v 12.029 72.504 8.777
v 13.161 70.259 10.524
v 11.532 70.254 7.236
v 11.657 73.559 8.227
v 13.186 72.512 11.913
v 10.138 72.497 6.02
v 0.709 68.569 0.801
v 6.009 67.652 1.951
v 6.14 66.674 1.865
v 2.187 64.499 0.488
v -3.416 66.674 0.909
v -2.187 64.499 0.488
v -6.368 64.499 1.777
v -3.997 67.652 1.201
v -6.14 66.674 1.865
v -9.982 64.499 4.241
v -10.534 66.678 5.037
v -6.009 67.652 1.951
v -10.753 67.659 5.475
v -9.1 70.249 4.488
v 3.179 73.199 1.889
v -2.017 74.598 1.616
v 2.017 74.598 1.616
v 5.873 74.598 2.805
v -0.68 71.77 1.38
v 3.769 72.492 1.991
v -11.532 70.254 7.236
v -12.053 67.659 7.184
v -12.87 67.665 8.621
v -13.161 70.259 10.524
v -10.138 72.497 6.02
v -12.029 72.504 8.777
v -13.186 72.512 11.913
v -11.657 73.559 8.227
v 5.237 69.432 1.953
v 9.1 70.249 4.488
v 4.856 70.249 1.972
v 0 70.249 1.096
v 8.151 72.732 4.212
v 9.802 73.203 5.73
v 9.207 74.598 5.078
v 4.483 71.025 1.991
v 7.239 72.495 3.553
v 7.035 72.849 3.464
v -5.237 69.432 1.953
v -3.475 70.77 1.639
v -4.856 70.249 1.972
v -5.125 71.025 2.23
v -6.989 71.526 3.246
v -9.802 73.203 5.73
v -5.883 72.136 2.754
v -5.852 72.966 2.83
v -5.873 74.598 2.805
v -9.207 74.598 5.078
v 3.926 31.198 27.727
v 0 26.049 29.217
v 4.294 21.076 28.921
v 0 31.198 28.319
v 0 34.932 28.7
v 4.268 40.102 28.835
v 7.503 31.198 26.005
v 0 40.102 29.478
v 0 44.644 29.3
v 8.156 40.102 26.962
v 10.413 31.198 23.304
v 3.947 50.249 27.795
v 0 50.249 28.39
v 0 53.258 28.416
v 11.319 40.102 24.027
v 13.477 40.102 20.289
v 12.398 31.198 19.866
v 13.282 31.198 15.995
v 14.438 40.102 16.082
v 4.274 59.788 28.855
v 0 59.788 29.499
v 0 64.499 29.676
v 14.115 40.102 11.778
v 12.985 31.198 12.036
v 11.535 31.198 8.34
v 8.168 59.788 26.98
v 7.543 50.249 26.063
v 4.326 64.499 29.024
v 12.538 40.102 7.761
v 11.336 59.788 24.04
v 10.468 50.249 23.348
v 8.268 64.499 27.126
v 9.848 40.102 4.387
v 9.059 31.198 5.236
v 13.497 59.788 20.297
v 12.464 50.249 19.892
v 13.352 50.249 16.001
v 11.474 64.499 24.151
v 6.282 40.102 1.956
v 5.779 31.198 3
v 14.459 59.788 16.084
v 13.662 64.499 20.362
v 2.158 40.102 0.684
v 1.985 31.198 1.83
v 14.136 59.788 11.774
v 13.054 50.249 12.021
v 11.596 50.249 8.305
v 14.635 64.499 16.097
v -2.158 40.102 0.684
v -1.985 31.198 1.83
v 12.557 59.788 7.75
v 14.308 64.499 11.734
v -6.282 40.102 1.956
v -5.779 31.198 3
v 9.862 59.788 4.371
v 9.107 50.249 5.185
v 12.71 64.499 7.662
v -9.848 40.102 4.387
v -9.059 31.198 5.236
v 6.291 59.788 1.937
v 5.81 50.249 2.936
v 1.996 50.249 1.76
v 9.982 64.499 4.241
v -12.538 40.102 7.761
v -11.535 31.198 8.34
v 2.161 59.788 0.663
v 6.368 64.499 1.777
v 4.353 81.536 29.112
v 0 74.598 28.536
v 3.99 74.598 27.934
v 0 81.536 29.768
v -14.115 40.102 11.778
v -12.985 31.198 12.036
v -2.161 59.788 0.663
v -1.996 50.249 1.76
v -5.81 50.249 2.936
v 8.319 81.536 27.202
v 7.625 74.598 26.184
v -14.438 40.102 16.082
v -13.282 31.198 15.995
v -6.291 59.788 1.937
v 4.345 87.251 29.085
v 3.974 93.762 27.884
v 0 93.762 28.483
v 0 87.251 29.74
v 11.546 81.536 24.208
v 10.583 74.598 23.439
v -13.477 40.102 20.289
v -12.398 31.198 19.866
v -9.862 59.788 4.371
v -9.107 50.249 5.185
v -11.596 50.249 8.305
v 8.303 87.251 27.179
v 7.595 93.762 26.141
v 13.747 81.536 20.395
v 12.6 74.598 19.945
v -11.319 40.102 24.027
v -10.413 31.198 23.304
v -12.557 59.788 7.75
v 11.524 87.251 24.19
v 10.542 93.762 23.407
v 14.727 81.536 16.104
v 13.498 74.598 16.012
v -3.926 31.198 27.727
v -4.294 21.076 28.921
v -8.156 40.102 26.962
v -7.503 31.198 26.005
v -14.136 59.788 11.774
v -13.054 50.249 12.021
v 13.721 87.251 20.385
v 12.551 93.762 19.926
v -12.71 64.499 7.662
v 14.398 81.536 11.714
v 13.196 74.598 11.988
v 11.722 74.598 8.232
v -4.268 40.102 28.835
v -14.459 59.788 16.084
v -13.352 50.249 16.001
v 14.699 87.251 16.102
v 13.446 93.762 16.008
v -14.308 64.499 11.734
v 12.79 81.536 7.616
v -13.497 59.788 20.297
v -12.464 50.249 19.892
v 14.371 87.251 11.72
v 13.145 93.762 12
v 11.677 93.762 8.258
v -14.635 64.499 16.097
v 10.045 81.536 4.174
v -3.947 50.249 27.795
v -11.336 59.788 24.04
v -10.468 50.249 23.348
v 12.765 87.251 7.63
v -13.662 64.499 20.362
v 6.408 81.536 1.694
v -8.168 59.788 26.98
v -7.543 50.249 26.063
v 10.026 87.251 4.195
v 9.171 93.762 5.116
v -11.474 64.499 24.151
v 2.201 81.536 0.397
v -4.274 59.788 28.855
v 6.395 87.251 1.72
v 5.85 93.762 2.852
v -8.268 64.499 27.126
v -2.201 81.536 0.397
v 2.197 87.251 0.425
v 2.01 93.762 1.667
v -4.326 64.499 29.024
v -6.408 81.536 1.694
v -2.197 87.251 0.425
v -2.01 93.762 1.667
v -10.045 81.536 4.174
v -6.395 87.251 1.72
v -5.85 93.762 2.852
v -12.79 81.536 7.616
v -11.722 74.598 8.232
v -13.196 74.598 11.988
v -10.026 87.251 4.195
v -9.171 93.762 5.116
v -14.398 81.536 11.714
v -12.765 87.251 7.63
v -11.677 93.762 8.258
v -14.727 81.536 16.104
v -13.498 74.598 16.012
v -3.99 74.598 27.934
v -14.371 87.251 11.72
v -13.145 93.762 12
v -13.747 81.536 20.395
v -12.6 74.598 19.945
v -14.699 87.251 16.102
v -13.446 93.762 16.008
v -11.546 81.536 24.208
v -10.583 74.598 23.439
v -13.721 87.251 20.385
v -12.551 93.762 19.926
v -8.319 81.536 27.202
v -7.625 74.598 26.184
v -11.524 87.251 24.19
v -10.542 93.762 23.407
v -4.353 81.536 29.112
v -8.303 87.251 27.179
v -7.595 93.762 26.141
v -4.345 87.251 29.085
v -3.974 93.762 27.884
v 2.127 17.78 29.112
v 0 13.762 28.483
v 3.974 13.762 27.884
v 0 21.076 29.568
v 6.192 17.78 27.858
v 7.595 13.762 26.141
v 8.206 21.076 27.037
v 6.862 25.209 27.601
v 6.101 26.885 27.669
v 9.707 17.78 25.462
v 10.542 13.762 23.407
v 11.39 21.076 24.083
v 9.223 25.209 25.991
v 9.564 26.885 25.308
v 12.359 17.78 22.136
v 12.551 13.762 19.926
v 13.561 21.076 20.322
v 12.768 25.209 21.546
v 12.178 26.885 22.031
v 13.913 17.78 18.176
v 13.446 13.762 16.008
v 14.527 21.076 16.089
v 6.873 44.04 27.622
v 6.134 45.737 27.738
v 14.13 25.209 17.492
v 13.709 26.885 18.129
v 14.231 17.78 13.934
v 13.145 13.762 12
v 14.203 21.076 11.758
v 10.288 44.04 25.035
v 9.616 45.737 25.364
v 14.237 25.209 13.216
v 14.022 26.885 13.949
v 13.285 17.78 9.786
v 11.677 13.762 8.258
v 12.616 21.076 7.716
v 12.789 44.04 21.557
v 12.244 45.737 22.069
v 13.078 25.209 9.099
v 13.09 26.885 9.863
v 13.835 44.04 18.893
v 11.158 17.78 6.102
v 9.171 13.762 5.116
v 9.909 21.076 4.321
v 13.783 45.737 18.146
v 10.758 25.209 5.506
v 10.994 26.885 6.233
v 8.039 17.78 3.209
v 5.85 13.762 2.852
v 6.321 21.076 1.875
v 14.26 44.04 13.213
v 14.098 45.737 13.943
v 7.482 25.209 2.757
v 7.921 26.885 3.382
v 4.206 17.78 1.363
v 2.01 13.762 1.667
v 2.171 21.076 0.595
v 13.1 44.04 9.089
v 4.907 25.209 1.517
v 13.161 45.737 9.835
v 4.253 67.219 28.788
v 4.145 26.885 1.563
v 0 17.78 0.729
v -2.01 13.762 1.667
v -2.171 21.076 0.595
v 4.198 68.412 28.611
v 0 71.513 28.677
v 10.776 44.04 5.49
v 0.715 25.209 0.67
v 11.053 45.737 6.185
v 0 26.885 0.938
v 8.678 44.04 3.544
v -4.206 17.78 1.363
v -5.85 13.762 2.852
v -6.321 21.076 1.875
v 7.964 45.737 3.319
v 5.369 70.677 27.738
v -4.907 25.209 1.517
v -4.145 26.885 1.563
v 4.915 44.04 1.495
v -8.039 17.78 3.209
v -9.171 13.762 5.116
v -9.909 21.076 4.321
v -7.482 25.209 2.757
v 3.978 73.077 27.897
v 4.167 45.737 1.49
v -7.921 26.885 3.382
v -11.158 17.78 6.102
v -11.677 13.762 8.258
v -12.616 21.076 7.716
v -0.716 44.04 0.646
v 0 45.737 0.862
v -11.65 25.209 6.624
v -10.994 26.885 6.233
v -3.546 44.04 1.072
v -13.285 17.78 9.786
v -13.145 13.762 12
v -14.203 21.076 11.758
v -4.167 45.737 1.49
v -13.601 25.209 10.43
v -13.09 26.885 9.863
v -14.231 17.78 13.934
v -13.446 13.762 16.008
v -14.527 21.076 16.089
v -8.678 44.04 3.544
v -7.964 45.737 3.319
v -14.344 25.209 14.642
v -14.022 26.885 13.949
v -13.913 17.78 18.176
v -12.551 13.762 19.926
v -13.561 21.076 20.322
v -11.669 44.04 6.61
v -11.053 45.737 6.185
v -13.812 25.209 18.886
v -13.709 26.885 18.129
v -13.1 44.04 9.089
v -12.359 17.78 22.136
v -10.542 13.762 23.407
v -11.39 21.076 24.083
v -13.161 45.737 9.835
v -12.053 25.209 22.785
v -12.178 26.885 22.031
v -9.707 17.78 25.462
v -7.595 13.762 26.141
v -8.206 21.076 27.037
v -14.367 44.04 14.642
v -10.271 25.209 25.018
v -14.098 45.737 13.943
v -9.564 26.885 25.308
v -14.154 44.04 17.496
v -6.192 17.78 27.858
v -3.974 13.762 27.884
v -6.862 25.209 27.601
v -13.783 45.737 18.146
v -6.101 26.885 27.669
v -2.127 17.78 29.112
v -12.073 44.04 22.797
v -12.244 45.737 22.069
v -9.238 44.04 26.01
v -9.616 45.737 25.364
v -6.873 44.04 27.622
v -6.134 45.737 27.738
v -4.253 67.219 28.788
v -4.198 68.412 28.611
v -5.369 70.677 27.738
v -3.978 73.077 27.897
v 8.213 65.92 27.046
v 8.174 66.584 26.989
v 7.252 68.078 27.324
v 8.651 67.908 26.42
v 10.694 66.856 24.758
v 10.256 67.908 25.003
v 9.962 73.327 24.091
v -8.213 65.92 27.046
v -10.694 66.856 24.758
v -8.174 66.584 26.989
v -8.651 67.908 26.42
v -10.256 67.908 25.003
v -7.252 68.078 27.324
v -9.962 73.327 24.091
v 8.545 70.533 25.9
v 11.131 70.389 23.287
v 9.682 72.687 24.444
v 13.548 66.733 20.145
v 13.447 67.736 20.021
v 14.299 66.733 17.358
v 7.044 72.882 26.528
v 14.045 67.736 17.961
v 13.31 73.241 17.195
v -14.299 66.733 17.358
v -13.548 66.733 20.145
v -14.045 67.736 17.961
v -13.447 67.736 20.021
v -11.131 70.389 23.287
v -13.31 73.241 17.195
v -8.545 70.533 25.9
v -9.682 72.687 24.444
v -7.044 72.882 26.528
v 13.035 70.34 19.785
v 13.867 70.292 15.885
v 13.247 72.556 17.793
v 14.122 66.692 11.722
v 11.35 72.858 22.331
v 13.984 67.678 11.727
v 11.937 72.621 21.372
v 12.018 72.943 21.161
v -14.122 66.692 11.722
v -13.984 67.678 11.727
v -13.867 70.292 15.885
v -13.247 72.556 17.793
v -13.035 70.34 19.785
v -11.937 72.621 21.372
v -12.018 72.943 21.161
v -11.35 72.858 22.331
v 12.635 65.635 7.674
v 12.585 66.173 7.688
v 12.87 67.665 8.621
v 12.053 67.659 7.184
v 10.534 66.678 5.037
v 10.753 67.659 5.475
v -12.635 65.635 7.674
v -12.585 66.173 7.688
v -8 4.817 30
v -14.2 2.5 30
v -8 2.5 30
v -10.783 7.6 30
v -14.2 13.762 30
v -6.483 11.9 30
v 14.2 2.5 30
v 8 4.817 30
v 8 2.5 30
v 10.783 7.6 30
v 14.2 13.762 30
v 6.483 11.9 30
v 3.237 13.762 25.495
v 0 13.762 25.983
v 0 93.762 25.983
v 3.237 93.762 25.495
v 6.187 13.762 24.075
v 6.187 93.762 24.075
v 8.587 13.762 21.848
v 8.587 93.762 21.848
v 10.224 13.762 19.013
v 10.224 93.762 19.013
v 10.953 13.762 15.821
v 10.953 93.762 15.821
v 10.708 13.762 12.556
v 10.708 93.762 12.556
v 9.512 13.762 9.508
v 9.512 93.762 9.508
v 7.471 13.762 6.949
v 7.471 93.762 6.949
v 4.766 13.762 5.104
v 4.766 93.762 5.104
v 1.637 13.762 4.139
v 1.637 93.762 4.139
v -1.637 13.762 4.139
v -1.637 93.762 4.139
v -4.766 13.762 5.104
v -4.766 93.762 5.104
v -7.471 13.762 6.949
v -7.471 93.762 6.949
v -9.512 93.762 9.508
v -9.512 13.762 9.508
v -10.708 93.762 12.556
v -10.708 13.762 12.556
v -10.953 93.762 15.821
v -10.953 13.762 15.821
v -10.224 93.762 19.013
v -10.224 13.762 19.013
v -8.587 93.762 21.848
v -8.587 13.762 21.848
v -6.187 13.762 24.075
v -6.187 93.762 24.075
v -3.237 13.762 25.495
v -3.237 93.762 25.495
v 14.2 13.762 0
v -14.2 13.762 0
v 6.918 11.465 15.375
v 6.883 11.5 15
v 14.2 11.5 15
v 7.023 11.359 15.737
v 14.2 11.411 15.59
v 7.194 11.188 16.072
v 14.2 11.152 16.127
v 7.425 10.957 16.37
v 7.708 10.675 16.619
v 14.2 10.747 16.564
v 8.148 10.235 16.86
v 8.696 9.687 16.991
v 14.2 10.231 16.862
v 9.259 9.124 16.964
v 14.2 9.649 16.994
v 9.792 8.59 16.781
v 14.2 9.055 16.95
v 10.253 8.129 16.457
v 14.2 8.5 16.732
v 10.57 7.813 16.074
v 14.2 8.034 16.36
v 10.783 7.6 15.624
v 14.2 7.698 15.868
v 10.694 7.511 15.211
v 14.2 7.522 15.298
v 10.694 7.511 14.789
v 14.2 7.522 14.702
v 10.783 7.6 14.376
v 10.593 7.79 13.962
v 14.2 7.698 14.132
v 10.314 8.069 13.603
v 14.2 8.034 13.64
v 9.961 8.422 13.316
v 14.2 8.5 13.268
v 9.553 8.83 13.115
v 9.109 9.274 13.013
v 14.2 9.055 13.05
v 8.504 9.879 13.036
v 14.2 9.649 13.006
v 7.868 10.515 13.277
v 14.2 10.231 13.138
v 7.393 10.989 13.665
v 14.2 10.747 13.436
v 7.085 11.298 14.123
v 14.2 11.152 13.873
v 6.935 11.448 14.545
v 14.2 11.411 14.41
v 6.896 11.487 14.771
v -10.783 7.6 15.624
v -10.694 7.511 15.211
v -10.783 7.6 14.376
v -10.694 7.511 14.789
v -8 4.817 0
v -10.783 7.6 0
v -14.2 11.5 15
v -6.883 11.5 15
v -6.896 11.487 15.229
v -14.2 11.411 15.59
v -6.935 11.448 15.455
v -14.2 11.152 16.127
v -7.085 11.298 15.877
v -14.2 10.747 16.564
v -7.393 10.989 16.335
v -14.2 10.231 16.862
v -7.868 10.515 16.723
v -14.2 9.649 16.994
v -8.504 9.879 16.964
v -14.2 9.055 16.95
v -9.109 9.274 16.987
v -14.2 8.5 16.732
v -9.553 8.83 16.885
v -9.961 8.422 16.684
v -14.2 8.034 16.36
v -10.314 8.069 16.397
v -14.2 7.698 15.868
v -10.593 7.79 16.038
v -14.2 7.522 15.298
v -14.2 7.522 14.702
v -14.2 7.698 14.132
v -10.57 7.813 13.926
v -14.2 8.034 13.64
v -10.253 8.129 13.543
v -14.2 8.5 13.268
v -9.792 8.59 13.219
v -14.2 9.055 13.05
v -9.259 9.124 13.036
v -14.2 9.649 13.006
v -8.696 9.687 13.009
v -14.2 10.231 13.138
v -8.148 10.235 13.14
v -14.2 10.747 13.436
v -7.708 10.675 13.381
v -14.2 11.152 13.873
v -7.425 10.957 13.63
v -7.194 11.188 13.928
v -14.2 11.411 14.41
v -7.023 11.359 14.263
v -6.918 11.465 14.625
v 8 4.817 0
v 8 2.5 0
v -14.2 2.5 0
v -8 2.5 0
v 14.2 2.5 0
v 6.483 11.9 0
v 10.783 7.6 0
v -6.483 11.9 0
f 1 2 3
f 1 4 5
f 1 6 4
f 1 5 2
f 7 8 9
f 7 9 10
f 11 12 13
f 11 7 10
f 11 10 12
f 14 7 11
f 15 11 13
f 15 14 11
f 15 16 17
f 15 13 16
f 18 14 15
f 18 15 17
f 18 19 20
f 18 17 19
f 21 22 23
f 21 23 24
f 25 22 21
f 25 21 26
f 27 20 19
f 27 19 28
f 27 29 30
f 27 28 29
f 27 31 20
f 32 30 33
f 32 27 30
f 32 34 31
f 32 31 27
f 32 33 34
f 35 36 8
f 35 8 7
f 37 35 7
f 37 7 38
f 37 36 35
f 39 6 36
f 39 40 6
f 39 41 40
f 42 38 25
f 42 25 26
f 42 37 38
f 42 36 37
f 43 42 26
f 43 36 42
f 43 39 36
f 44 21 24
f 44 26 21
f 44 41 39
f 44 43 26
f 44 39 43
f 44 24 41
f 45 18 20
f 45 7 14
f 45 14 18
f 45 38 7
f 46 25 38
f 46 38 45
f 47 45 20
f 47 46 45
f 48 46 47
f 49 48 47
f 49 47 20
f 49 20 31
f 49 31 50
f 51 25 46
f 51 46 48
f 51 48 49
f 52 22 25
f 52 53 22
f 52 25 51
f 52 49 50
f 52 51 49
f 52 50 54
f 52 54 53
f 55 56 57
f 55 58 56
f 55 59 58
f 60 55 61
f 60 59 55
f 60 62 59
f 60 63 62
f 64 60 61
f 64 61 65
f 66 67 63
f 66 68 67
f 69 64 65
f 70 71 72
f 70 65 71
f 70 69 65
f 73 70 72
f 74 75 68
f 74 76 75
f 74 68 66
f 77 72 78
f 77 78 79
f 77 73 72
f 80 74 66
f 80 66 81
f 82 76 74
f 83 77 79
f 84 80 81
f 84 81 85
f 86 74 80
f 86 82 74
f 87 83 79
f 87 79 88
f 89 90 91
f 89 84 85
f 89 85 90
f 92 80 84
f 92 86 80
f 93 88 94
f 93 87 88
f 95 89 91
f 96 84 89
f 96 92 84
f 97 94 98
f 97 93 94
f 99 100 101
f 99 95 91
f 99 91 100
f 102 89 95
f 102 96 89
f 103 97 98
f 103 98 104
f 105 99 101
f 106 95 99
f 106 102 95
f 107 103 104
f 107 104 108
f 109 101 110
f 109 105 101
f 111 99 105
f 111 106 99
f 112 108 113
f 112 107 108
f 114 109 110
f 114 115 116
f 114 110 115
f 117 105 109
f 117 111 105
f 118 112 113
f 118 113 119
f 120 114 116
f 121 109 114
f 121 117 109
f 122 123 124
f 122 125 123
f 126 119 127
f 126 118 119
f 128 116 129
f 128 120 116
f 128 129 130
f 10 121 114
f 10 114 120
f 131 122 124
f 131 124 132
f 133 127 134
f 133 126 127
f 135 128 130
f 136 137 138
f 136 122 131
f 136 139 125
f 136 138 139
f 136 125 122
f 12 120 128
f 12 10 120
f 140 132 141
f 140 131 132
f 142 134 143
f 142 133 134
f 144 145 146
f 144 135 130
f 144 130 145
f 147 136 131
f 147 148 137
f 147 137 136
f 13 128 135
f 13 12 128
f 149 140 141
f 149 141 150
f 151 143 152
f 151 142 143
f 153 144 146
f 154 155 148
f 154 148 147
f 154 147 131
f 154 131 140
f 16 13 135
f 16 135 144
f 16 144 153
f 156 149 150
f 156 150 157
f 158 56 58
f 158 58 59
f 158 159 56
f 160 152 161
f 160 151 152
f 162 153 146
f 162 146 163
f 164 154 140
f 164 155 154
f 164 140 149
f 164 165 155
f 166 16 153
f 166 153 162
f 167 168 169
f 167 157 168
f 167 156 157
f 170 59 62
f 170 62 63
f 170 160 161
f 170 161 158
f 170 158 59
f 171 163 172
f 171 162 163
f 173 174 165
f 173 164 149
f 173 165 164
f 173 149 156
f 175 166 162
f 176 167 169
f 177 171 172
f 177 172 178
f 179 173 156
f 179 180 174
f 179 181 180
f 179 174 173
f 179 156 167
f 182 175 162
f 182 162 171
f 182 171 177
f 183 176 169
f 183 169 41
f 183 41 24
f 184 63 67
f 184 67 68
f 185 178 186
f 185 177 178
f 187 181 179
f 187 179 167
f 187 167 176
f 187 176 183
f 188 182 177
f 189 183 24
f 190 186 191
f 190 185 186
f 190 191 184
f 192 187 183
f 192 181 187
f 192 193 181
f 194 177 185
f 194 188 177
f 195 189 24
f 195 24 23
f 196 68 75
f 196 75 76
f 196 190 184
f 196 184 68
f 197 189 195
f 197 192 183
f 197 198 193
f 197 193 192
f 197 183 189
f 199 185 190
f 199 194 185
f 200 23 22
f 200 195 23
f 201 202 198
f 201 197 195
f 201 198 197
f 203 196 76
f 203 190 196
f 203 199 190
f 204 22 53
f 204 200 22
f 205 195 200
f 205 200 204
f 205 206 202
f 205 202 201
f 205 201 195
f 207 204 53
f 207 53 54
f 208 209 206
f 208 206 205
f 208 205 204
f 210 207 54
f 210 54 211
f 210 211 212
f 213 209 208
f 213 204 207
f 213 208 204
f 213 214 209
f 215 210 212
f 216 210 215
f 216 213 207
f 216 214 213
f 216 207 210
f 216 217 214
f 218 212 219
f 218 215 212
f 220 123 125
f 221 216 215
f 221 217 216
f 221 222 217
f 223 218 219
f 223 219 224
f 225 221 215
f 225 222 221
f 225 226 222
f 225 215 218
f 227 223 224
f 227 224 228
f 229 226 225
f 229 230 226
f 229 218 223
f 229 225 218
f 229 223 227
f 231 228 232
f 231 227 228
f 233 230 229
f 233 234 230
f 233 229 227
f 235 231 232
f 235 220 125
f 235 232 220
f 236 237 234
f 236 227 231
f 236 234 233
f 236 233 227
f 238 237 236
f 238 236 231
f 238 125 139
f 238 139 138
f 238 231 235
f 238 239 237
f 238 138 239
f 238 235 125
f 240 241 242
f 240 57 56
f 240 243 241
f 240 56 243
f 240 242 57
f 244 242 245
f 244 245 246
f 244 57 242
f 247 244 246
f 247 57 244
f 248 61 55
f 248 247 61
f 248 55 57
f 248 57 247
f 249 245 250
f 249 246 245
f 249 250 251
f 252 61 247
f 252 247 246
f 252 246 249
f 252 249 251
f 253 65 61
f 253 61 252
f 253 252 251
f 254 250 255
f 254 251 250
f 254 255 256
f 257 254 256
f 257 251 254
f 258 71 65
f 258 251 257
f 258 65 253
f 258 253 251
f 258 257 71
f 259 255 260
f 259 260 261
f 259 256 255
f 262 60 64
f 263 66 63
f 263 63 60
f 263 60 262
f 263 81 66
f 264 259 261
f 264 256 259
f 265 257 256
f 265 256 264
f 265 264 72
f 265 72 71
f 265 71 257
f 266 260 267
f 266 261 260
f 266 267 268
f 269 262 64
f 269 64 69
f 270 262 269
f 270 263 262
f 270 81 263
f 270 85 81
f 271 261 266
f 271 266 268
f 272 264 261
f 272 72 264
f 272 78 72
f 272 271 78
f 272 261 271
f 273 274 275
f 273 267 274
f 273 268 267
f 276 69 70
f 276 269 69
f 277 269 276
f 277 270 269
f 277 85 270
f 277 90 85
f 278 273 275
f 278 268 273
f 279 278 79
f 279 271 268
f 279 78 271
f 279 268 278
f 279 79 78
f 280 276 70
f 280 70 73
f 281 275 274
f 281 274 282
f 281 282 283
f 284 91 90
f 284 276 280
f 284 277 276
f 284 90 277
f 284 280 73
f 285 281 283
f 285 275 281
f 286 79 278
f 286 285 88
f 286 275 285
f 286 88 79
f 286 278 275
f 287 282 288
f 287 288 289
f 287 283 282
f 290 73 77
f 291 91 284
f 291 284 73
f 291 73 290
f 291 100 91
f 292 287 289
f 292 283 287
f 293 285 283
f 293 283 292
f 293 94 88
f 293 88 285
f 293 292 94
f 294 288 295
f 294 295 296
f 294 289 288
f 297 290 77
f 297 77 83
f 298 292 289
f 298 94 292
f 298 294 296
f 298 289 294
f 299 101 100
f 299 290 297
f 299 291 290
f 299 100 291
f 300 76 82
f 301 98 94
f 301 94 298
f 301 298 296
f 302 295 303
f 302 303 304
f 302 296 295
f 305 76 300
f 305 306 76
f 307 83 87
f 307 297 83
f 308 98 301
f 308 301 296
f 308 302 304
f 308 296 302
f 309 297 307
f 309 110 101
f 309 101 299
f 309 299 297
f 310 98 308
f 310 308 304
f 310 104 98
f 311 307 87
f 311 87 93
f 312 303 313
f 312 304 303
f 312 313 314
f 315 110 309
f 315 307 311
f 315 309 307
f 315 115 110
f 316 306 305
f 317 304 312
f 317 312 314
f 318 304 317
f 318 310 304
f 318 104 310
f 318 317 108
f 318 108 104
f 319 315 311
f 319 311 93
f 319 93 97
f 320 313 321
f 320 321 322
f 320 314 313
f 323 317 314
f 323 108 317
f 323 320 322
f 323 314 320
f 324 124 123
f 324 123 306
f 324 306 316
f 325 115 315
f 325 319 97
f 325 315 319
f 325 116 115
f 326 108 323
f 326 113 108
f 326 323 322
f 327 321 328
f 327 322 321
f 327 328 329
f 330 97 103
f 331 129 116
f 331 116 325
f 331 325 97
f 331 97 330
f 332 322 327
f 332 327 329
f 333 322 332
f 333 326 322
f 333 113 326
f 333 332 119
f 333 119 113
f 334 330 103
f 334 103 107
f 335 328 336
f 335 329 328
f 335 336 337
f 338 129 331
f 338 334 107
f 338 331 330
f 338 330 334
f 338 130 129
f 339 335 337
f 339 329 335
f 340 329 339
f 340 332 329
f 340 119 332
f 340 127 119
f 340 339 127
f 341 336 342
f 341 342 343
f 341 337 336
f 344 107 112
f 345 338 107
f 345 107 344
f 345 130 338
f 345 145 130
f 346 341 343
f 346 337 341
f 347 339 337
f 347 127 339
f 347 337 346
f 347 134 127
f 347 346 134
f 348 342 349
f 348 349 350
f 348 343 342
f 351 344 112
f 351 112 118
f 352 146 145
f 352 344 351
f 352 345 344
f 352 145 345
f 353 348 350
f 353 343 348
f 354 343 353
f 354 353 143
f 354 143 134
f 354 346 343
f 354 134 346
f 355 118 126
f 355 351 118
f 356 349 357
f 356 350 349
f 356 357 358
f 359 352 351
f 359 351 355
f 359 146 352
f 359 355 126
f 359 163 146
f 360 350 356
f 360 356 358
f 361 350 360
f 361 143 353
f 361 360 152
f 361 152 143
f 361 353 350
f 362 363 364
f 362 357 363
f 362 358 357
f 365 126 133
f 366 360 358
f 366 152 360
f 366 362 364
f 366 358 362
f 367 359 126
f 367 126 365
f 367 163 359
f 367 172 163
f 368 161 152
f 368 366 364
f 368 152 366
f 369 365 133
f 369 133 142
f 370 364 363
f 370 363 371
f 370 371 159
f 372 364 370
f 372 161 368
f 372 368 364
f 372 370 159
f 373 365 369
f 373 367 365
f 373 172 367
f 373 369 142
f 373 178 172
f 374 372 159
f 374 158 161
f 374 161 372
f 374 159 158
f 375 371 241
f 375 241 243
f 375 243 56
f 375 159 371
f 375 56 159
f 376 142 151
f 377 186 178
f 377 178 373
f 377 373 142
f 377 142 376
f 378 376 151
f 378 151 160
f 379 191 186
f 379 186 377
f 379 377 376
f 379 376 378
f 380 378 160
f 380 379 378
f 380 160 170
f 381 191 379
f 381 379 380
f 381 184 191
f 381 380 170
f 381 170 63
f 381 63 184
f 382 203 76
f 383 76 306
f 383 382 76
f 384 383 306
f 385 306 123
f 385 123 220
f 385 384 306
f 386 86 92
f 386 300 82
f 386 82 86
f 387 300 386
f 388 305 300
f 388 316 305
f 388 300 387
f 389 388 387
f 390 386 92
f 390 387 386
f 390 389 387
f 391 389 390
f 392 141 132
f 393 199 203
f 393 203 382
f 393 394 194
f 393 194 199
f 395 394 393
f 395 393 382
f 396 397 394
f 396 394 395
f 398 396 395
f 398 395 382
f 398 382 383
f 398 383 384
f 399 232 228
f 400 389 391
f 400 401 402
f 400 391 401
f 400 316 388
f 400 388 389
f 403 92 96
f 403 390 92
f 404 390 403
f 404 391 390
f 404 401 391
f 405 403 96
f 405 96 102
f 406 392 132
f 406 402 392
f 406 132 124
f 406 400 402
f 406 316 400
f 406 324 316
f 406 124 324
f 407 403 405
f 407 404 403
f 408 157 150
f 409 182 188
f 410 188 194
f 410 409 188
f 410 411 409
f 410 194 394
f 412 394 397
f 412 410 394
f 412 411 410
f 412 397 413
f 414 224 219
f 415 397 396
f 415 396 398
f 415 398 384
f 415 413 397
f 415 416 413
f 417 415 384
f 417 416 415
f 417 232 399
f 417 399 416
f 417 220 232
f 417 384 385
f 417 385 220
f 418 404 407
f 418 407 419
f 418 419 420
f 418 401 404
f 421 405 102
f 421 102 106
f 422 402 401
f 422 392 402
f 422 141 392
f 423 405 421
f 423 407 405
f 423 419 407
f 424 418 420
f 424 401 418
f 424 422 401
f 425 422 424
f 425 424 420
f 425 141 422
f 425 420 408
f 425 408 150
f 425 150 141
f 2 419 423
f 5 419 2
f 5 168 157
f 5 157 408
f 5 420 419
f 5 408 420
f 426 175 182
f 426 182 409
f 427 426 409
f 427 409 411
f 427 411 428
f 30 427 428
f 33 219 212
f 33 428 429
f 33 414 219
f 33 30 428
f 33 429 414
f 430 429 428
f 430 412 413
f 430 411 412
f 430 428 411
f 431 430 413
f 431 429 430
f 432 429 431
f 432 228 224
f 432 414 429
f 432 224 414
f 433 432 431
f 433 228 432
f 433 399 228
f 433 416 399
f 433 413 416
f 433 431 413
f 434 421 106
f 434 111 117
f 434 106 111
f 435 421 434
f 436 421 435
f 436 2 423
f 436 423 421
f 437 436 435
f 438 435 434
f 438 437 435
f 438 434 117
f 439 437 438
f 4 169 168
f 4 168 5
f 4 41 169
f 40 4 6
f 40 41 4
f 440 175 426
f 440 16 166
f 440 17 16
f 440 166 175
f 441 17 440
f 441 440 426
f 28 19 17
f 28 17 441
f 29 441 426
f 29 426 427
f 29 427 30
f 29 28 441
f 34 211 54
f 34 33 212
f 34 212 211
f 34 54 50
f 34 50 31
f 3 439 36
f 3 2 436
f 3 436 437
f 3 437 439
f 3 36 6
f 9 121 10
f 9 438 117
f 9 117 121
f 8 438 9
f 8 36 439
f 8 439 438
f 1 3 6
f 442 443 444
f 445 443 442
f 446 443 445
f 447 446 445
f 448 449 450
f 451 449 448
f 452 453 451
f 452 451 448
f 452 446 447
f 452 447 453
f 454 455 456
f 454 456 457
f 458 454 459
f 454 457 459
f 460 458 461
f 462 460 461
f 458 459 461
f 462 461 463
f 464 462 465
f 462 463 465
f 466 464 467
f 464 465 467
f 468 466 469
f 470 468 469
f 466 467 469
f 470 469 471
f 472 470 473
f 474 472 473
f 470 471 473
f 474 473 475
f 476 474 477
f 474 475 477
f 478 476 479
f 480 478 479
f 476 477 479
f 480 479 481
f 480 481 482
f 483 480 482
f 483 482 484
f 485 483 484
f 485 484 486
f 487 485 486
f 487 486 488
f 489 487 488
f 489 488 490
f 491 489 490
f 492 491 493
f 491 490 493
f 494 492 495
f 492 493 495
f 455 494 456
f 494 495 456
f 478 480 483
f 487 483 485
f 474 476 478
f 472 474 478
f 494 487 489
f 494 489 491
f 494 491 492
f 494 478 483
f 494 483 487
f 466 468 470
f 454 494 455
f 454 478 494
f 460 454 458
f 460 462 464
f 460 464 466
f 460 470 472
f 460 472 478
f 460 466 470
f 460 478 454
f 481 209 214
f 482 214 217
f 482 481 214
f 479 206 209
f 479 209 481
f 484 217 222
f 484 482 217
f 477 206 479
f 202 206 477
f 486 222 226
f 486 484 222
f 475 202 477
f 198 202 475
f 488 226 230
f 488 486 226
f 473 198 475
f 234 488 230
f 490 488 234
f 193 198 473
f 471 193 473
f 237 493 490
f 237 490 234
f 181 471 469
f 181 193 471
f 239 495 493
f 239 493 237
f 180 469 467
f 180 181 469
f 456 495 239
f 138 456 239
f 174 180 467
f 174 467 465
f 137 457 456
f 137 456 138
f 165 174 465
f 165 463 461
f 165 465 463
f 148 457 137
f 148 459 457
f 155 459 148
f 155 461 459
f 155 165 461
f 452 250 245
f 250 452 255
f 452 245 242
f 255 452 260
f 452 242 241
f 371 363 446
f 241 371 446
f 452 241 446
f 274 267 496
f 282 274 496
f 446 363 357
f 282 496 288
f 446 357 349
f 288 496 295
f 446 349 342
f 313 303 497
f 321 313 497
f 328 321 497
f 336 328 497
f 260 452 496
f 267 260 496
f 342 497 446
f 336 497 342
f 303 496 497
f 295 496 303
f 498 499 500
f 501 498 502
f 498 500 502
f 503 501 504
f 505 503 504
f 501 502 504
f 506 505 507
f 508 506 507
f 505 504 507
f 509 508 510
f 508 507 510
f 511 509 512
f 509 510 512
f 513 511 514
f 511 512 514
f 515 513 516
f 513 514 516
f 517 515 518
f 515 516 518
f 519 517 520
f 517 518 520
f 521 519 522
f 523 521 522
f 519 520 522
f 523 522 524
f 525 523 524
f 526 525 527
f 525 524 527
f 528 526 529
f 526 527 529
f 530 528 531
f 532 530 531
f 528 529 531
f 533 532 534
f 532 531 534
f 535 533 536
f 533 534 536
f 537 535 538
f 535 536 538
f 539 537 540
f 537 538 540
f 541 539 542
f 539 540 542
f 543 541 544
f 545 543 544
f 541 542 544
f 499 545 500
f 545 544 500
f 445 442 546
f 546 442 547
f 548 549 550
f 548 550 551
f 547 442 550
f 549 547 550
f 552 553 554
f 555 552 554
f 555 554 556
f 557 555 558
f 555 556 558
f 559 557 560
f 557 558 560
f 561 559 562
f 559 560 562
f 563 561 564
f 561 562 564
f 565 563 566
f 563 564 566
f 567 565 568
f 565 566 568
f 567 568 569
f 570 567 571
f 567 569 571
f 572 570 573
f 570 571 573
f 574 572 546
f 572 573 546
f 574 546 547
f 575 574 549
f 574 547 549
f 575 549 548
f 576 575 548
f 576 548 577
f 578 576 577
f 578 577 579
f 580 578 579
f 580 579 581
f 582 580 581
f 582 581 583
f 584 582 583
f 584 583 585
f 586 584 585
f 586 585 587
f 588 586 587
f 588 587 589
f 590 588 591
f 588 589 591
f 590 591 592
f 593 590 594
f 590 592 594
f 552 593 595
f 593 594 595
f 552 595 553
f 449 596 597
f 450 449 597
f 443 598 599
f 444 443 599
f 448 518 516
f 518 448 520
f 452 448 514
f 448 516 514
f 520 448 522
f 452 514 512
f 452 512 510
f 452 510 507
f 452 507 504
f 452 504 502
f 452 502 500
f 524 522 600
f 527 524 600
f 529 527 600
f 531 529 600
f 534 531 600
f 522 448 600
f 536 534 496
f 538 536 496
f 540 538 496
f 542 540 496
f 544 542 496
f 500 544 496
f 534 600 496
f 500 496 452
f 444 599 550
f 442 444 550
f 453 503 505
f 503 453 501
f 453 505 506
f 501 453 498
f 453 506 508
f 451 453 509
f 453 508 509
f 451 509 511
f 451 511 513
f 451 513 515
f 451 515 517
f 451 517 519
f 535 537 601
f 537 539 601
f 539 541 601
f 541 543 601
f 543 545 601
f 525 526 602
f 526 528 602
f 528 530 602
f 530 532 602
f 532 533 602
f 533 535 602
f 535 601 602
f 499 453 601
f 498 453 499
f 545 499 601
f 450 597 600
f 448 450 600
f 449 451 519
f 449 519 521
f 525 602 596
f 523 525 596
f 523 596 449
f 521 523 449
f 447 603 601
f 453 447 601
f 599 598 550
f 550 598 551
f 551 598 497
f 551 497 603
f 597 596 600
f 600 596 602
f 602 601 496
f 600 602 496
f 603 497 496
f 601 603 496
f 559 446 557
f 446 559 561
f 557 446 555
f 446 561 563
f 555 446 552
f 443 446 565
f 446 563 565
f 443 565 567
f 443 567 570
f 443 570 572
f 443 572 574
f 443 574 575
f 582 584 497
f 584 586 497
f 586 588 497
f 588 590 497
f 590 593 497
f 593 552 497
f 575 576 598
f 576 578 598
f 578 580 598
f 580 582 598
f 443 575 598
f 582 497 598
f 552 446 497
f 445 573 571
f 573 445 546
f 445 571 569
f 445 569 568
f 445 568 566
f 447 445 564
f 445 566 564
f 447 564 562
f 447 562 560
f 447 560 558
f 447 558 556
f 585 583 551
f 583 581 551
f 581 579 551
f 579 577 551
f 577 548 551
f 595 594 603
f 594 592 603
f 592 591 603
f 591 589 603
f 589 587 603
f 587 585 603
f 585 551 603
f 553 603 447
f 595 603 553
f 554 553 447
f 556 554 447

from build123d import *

# Parameters (mm, degrees)
BOSS_EXTRUDE1_DEPTH = 30
SKETCH3_R           = 2
CUT_EXTRUDE2_DEPTH  = 29.4
SKETCH11_R          = 10.983403138
CUT_EXTRUDE3_DEPTH  = 80


with BuildPart() as part:
    # Sketch1 → Boss-Extrude1 (new body)
    with BuildSketch(Plane.XY):
        Polygon((14.2, 13.761910466), (-14.2, 13.761910466), (-14.2, 2.5), (-11.082842712, 2.5), (-8, 2.5), (-8, 4.817157288), (-10.782842712, 7.6), (-6.482842712, 11.9), (6.482842712, 11.9), (10.782842712, 7.6), (8, 4.817157288), (8, 2.5), (11.082842712, 2.5), (14.2, 2.5), align=None)
    extrude(amount=BOSS_EXTRUDE1_DEPTH)

    # Sketch3 → Cut-Extrude2 (cut, through all)
    with BuildSketch(Plane(origin=(14.2, 0, 0), x_dir=(0, 0, -1), z_dir=(1, 0, 0))):
        with Locations(Location((-15, 9.5, 0), (0, 0, 90))):  # turned: the seam where the file's is
            Circle(SKETCH3_R)
    extrude(amount=-CUT_EXTRUDE2_DEPTH, mode=Mode.SUBTRACT)

    # Sketch9 → Revolve2 (revolve)
    with BuildSketch(Plane(origin=(0, 0, 0), x_dir=(0, 0, -1), z_dir=(1, 0, 0))):
        with BuildLine():
            Line((-28.483403138, 93.761910466), (-15, 93.761910466))
            Line((-15, 93.761910466), (-15, 13.761910466))
            Line((-15, 13.761910466), (-28.483403138, 13.761910466))
            add(Edge.make_bspline(
                [(-28.483403138, 13.761910466), (-31.145086737, 24.692296315), (-27.121377906, 28.762236937), (-30.913064787, 43.557319505), (-27.295577593, 49.132991937), (-31.19480755, 65.565333342), (-25.775389052, 74.245854005), (-31.645928371, 82.017446749), (-28.483403138, 93.761910466)],
                knots=[0, 0, 0, 0, 0.086706603, 0.114658805, 0.26120389, 0.315545924, 0.639761013, 1, 1, 1, 1], degree=3))
        make_face()
    revolve(axis=Axis((0, 13.761910466, 15), (0, 1, 0)))

    # Sketch11 → Cut-Extrude3 (cut)
    with BuildSketch(Plane(origin=(0, 93.761910466, 0), x_dir=(1, 0, 0), z_dir=(0, 1, 0))):
        with Locations(Location((0, -15, 0), (0, 0, 270))):  # turned: the seam where the file's is
            Circle(SKETCH11_R)
    extrude(amount=-CUT_EXTRUDE3_DEPTH, mode=Mode.SUBTRACT)


solid = part.part
